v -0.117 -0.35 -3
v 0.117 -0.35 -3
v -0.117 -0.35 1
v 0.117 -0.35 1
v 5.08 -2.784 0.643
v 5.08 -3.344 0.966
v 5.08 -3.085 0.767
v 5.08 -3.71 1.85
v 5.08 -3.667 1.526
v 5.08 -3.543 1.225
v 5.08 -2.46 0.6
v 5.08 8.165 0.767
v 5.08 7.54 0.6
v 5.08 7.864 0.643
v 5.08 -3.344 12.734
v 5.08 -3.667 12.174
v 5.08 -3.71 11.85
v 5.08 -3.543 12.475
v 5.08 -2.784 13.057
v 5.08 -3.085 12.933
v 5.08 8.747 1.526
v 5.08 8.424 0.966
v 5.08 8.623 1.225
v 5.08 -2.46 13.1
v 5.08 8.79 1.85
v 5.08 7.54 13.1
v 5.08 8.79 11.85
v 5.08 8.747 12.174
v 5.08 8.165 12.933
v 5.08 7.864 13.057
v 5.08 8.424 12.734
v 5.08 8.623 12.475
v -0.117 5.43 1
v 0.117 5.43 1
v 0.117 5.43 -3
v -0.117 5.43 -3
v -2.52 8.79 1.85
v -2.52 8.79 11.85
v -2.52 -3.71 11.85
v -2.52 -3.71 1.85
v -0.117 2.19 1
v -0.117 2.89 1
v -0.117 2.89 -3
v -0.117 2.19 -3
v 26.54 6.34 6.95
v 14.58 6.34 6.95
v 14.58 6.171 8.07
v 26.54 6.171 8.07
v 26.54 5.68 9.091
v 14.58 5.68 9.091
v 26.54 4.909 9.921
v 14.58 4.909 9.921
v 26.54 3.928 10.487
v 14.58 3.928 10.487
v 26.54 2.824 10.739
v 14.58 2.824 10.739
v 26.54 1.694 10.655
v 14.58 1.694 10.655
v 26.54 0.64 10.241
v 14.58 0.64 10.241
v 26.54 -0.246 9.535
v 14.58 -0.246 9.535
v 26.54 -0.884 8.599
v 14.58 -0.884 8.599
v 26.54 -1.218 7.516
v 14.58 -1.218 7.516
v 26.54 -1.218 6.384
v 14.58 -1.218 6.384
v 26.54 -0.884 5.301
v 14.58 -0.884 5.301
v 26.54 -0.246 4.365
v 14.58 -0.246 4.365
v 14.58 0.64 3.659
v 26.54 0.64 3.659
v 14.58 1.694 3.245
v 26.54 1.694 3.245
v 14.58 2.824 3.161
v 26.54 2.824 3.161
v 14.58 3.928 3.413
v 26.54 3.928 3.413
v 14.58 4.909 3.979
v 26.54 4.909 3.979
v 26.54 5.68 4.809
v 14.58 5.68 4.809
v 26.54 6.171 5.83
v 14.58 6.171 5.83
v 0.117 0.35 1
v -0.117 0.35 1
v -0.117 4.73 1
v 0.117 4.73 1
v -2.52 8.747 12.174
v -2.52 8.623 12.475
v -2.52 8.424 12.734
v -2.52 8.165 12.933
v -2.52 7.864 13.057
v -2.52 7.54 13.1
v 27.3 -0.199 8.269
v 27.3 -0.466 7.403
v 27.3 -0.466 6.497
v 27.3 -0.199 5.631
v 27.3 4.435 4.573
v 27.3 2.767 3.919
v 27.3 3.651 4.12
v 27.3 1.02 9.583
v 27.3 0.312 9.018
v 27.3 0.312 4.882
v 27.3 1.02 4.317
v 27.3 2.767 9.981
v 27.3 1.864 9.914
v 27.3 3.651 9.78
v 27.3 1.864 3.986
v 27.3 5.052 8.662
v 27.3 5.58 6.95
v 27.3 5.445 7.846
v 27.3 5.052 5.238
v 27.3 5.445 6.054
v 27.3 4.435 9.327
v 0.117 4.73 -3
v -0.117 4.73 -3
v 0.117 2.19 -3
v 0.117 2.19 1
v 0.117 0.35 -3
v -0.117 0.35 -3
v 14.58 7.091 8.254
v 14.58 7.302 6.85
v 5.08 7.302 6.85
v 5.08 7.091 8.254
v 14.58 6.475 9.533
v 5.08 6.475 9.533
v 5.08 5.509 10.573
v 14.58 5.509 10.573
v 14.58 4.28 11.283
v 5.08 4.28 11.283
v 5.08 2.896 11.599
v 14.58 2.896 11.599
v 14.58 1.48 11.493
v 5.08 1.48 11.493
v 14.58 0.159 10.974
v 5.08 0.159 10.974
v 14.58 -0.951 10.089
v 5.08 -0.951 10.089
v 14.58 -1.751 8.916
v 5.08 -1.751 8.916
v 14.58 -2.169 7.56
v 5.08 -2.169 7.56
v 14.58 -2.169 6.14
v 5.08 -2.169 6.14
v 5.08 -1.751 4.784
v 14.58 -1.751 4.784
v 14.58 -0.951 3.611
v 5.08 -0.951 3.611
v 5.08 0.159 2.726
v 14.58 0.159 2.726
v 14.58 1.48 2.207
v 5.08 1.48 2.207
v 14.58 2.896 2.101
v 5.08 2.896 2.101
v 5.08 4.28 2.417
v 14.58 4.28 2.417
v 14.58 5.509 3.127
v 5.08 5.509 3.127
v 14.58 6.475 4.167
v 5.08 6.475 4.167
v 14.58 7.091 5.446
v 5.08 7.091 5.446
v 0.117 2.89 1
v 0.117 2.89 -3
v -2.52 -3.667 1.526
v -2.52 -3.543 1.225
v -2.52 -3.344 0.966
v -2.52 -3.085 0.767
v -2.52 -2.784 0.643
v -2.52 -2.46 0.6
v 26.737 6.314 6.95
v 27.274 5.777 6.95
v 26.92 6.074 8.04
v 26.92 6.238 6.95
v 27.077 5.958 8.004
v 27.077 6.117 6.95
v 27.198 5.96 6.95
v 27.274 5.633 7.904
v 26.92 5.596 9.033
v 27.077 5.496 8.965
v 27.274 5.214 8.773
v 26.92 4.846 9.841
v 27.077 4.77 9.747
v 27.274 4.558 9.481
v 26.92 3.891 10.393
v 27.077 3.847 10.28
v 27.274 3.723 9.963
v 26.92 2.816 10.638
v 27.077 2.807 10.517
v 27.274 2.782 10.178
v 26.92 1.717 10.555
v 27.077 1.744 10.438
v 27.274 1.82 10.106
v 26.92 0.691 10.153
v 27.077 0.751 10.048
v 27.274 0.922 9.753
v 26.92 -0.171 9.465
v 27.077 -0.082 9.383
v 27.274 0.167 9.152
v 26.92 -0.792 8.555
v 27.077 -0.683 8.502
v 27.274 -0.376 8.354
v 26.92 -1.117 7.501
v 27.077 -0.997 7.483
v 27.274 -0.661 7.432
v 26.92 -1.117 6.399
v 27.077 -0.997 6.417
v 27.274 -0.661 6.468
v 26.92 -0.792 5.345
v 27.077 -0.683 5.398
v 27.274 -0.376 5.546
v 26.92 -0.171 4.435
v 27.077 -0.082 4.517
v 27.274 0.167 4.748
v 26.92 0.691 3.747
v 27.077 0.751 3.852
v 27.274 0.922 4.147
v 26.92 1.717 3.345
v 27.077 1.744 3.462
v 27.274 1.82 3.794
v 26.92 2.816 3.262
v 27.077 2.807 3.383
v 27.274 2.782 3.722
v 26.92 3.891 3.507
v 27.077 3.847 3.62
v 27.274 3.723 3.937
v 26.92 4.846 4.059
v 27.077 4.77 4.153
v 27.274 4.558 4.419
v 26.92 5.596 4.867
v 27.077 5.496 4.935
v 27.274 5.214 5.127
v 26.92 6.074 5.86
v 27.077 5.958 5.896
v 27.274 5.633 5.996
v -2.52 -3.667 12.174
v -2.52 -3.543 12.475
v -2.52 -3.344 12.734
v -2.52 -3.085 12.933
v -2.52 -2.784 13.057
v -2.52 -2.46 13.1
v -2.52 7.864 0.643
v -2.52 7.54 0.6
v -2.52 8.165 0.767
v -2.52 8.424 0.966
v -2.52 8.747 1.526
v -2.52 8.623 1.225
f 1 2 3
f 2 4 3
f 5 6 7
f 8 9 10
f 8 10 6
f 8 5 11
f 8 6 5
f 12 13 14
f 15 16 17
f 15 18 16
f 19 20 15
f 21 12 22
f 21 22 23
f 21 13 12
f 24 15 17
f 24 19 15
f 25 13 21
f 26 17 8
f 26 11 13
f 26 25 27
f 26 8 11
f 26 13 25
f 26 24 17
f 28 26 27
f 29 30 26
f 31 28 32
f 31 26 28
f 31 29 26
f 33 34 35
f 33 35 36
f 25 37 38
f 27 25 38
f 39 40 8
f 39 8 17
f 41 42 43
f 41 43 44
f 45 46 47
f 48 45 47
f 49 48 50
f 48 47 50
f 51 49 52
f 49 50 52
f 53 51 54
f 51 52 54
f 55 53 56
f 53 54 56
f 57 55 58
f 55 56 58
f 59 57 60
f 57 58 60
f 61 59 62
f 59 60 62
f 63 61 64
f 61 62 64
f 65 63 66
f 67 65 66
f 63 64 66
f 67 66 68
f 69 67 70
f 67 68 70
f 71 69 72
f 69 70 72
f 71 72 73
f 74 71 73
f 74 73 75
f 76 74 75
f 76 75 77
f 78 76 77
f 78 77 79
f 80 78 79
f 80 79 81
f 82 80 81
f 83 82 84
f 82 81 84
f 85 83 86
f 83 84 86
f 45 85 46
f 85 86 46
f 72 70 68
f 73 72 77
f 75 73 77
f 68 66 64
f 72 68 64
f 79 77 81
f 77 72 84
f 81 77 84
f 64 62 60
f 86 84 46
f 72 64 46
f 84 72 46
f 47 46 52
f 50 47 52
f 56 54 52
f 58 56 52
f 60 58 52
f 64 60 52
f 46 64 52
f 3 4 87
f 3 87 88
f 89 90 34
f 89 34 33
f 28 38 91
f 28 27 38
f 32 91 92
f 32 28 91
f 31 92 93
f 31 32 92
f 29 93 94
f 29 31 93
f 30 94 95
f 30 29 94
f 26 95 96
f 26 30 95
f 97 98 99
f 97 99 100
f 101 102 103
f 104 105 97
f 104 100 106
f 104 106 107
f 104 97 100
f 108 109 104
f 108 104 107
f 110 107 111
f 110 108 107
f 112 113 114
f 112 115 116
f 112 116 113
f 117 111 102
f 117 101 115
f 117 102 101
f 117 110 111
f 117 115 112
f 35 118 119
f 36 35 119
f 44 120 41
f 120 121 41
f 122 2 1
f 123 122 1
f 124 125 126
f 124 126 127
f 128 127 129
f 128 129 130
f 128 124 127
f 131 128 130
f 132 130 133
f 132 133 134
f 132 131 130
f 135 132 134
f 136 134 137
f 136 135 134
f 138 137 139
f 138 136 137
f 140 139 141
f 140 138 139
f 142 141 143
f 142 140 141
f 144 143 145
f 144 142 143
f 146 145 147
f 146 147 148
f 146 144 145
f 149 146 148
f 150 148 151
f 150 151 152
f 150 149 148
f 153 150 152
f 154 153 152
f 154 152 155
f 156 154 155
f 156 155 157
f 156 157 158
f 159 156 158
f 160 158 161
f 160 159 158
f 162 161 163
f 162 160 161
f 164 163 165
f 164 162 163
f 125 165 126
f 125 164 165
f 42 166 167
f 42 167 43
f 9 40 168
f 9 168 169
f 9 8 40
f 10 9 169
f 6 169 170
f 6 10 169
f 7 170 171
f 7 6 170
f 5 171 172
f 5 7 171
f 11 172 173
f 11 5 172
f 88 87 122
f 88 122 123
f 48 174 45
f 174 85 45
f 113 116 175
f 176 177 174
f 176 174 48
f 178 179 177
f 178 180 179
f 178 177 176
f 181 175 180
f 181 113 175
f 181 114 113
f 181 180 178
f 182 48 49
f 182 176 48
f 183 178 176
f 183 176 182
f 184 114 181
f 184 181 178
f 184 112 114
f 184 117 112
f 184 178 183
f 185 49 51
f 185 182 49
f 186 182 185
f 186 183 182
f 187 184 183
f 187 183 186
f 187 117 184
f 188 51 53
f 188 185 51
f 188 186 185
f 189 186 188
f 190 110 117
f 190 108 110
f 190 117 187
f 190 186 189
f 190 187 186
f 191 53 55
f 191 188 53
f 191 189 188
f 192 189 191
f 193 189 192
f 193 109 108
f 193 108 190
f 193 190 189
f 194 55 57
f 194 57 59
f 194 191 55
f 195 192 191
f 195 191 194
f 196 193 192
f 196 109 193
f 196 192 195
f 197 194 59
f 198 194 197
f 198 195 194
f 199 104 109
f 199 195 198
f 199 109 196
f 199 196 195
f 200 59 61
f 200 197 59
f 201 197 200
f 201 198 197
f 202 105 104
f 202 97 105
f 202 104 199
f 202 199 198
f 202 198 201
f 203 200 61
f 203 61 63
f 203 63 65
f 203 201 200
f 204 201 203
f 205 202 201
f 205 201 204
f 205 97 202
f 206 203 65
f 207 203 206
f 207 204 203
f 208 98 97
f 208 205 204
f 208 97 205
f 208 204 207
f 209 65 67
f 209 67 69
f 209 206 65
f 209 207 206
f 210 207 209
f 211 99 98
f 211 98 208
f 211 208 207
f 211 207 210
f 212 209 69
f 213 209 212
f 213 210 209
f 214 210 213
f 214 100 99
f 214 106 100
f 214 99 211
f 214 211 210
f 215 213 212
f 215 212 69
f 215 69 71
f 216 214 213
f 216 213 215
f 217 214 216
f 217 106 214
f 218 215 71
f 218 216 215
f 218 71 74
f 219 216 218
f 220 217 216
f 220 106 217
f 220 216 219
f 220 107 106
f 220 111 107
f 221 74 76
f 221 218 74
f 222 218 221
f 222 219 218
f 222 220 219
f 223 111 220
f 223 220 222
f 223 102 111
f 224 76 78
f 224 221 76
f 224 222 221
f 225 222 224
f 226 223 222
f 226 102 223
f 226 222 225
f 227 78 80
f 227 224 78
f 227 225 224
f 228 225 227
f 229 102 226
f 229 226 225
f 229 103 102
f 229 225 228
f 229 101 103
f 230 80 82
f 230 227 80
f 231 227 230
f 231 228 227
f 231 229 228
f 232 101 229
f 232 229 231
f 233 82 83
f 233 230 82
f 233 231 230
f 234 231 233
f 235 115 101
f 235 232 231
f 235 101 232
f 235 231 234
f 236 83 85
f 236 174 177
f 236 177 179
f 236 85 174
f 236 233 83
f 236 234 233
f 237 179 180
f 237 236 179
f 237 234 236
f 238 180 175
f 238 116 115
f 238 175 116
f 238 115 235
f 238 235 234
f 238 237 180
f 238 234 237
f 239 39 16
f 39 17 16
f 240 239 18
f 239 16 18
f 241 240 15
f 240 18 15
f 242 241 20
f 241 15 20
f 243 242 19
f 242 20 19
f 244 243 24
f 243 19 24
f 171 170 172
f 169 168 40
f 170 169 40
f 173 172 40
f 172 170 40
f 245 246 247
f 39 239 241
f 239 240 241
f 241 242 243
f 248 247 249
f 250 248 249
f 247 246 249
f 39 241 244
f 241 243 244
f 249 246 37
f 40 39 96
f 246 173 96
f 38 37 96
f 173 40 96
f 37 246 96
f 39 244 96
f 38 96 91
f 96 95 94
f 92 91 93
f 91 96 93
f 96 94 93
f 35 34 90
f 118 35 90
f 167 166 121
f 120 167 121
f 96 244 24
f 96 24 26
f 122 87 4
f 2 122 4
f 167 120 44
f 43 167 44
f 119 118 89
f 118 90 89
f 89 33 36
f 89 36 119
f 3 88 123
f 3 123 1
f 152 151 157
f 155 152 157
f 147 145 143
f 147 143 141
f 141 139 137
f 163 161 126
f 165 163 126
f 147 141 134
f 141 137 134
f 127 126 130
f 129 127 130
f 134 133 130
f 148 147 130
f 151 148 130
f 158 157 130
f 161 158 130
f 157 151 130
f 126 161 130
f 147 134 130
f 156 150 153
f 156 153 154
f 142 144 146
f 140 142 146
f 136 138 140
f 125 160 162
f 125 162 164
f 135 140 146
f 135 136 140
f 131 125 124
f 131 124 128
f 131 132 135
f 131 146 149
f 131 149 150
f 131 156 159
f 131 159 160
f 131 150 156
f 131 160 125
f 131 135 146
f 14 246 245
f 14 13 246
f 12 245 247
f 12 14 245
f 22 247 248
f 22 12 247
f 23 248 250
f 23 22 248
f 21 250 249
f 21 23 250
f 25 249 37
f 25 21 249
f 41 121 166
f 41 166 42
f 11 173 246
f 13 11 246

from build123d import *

# Parameters (mm, degrees)
SKETCH001_R       = 4.7625
PAD001_DEPTH      = 9.5
SKETCH003_W       = 0.233334
SKETCH003_H       = 0.7
PAD002_DEPTH      = 1
PAD002_DEPTH_BACK = 3
SKETCH004_R       = 3.8
PAD003_DEPTH      = 12.72
FILLET_R          = 0.76
SKETCH_W          = 12.5
SKETCH_H          = 12.5
PAD_DEPTH         = 7.6
FILLET001_R       = 1.25


with BuildPart() as pad001:
    # Sketch001 → Pad001 (new body)
    with BuildSketch(Plane.YZ.offset(14.58)):
        with Locations((2.54, 6.85)):
            Circle(SKETCH001_R)
    extrude(amount=-PAD001_DEPTH)


with BuildPart() as pad002:
    # Sketch003 → Pad002 (new body, two sides)
    with BuildSketch(Plane(origin=(0, 0, 0), x_dir=(-1, 0, 0), z_dir=(0, 0, 1))) as pad002_sk:
        Rectangle(SKETCH003_W, SKETCH003_H)
        with Locations((0, -2.54)):
            Rectangle(SKETCH003_W, SKETCH003_H)
        with Locations((0, -5.08)):
            Rectangle(SKETCH003_W, SKETCH003_H)
    extrude(amount=PAD002_DEPTH)
    extrude(pad002_sk.sketch, amount=-PAD002_DEPTH_BACK)


with BuildPart() as fillet_body:
    # Sketch004 → Pad003 (new body)
    with BuildSketch(Plane.YZ.offset(14.58)):
        with Locations((2.54, 6.95)):
            Circle(SKETCH004_R)
    extrude(amount=PAD003_DEPTH)

    # Fillet
    fillet_edges = [fillet_body.edges().sort_by_distance(p)[0] for p in [
        (27.3, -1.26, 6.95),
    ]]
    fillet(fillet_edges, radius=FILLET_R)


with BuildPart() as fillet001:
    # Sketch → Pad (new body)
    with BuildSketch(Plane.YZ.offset(-2.52)):
        with Locations((2.54, 6.85)):
            Rectangle(SKETCH_W, SKETCH_H)
    extrude(amount=PAD_DEPTH)

    # Fillet001
    fillet001_edges = [fillet001.edges().sort_by_distance(p)[0] for p in [
        (1.28, -3.71, 13.1),
        (1.28, 8.79, 13.1),
        (1.28, -3.71, 0.6),
        (1.28, 8.79, 0.6),
    ]]
    fillet(fillet001_edges, radius=FILLET001_R)


solid = Compound([pad001.part, pad002.part, fillet_body.part, fillet001.part])
